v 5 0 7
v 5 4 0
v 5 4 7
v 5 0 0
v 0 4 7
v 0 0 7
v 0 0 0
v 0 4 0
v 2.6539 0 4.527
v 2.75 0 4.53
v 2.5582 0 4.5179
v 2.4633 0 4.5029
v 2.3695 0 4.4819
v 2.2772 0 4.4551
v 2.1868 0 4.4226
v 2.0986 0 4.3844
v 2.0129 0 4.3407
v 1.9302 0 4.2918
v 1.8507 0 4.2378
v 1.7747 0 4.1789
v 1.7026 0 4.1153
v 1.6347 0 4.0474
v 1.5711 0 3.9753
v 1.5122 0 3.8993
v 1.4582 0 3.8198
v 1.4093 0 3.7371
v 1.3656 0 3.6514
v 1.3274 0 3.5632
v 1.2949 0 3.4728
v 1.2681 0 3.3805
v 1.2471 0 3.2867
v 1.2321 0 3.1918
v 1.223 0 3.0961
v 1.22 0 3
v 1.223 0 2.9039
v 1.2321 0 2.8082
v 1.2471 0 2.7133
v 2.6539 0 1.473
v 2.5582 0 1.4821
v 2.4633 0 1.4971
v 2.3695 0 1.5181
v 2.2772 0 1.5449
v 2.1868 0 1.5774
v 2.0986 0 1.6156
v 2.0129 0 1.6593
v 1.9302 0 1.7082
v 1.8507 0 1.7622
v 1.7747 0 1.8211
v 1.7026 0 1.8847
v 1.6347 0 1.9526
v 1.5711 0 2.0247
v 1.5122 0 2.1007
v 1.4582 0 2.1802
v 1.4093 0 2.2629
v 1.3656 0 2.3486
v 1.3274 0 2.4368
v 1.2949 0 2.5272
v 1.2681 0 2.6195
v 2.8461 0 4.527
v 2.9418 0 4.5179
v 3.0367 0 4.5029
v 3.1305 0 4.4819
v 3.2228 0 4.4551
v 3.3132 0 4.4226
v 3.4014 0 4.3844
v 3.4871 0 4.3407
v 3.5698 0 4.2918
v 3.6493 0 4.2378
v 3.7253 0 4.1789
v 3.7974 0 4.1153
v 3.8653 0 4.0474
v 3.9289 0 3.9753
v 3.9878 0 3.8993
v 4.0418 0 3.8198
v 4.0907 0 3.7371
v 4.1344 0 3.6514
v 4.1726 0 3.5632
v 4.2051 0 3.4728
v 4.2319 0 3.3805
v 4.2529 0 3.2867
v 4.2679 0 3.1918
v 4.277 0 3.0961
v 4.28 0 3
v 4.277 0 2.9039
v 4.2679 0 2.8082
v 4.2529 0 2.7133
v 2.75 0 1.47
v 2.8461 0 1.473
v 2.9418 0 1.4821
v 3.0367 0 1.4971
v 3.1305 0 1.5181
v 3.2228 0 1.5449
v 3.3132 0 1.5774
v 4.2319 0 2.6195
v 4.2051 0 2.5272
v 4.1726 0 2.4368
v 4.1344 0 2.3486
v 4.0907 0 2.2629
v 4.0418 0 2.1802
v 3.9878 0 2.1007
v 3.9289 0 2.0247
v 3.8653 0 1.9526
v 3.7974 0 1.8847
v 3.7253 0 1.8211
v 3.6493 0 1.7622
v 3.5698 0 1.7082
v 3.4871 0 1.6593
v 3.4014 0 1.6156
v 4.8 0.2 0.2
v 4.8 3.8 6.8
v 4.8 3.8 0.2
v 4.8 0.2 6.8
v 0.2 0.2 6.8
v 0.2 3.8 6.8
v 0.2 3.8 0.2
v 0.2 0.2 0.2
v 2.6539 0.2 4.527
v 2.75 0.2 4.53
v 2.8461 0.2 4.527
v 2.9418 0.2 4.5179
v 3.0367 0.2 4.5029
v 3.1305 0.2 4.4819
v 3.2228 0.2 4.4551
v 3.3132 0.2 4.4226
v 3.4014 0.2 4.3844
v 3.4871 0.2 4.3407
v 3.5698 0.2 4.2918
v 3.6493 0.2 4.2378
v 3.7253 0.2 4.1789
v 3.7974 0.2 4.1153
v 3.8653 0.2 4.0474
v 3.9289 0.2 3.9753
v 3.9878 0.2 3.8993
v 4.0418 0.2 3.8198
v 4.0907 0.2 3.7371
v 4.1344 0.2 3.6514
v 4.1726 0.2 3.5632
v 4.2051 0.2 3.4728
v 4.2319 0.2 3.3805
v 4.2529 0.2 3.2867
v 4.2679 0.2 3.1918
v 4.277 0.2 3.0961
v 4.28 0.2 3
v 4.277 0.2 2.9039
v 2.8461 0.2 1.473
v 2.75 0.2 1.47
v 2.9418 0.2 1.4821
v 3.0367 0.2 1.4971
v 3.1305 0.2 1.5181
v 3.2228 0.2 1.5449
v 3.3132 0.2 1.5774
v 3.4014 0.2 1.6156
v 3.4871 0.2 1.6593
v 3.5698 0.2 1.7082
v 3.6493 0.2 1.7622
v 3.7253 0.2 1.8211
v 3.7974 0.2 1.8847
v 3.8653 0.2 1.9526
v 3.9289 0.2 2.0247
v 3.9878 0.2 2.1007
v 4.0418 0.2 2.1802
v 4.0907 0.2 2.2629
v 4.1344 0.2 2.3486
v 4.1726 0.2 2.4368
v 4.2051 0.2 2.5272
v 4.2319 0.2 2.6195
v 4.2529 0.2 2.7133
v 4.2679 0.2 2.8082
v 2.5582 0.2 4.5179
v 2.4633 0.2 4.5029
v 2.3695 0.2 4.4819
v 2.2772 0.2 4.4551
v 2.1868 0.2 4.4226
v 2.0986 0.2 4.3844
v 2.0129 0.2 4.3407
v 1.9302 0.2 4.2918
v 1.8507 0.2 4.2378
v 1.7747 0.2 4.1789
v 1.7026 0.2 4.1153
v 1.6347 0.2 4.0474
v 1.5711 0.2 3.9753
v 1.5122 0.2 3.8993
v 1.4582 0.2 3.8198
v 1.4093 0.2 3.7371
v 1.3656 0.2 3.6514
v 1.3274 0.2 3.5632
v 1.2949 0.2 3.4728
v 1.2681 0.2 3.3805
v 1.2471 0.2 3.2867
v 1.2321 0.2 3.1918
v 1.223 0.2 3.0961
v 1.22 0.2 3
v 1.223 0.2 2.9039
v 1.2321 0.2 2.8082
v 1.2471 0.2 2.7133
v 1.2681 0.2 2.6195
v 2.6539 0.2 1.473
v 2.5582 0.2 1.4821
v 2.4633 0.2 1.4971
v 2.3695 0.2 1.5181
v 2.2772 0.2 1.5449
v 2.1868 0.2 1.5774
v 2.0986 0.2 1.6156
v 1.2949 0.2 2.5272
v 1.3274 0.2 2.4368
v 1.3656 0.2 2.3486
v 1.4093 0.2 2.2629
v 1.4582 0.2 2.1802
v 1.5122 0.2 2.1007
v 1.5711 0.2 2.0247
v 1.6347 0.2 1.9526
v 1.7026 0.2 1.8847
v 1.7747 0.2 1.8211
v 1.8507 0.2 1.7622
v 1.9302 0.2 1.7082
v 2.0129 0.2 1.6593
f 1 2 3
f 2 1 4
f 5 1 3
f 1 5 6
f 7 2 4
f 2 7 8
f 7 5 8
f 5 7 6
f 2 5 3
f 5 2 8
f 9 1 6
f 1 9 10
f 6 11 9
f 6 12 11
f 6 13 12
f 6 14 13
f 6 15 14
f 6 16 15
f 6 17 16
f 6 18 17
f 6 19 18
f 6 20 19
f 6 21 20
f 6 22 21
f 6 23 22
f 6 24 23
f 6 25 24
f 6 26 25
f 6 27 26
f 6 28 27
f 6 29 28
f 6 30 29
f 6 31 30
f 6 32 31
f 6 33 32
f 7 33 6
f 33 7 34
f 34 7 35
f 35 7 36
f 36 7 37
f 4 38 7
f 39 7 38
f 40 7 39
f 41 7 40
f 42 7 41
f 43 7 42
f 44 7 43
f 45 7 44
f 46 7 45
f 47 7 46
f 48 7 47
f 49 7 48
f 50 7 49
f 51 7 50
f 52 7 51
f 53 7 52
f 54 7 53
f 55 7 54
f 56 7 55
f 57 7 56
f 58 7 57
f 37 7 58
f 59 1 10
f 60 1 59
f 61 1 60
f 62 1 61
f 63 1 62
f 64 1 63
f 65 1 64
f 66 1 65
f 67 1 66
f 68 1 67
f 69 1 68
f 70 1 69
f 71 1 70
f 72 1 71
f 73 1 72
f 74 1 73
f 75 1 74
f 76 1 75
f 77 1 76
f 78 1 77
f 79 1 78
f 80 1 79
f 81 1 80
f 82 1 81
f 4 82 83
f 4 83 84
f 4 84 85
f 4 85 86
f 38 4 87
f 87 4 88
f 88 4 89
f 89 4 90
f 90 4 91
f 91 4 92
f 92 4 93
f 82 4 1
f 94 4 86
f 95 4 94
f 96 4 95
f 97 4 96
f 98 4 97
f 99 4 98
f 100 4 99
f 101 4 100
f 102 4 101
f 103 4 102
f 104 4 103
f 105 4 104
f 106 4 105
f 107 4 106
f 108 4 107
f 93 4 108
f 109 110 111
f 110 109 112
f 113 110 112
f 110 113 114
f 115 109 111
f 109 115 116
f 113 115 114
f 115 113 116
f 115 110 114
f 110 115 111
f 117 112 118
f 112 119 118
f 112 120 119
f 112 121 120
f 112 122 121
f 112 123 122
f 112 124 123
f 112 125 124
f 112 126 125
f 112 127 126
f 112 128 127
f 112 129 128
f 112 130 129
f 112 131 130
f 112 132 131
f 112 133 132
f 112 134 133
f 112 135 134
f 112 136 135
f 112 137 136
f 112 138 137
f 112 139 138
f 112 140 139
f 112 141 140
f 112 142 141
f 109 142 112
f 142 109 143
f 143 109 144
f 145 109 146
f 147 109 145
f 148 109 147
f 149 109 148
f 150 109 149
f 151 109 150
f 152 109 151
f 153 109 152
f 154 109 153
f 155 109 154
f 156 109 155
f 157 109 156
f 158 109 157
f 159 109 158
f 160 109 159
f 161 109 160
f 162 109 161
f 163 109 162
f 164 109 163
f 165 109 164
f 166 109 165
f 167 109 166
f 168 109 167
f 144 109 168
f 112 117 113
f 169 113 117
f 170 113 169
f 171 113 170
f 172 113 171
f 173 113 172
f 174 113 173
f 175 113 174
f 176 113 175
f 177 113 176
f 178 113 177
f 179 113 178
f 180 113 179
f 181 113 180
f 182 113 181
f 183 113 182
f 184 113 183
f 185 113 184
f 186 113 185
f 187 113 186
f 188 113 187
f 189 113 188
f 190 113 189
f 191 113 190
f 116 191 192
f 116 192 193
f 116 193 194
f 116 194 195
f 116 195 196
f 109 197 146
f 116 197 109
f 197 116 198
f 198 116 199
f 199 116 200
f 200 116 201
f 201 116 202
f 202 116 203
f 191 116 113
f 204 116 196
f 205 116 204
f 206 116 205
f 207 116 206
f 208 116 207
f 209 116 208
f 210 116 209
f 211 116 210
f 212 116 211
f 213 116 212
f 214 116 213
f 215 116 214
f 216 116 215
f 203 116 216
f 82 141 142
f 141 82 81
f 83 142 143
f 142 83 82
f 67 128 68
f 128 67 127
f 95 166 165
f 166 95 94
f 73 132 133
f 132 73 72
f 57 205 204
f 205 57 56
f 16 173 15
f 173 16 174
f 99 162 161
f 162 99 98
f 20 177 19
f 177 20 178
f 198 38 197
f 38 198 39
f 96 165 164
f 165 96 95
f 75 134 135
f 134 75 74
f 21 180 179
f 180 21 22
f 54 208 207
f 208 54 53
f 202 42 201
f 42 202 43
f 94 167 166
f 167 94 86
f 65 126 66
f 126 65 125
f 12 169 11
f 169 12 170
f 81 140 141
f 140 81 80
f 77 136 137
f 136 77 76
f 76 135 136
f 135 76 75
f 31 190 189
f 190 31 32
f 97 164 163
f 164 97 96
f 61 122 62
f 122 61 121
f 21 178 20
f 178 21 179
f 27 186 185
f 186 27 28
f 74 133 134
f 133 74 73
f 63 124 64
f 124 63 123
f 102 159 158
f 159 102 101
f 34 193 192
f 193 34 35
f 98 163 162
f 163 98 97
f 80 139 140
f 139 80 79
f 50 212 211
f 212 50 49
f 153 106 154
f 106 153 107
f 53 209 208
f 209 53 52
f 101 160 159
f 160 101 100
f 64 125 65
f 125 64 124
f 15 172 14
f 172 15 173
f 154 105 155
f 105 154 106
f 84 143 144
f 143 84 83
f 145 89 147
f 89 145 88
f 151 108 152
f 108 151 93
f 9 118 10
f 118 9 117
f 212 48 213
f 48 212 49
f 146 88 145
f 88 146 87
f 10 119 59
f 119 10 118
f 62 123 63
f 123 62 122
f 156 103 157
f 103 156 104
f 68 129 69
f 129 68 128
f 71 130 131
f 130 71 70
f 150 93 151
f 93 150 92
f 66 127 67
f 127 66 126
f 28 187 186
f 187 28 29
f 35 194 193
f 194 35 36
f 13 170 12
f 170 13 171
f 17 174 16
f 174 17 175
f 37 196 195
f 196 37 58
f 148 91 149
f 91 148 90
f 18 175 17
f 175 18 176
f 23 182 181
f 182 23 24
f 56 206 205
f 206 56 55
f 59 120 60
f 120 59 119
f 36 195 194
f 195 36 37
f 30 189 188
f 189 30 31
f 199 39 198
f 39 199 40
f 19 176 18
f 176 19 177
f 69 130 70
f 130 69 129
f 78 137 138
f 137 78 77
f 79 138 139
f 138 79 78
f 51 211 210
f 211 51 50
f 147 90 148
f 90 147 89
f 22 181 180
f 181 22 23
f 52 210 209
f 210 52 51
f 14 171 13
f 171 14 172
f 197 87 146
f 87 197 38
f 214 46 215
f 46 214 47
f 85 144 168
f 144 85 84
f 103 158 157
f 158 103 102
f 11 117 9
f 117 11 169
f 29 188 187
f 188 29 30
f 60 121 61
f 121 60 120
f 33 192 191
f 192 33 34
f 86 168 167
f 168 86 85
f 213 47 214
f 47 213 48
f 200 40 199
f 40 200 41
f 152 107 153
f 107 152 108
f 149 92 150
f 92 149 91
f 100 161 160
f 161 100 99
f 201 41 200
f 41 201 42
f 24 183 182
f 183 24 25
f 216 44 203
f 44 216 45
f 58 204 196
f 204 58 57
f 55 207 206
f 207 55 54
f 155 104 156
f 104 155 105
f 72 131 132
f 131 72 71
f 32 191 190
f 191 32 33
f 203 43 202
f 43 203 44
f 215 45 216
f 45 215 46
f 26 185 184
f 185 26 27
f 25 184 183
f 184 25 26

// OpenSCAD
// 3D speaker box module

// This module creates our hollow box
module makeBox() {
    difference() {cube([5, 4, 7], false); 
                  translate([0.2, 0.2, 0.2]) 
                  cube([4.6, 3.6, 6.6]);};
}

// This module creates the hole for the driver
module driverHole() {
    translate([2.75, .25, 3]) rotate([90, 0, 0]) cylinder(0.5, 1.53, 1.53, false);
}
// This module adds the hole to the hollow box
module makeHole() {
    $fn = 100;
    difference() {makeBox(); driverHole(); };
}

makeHole();
  
